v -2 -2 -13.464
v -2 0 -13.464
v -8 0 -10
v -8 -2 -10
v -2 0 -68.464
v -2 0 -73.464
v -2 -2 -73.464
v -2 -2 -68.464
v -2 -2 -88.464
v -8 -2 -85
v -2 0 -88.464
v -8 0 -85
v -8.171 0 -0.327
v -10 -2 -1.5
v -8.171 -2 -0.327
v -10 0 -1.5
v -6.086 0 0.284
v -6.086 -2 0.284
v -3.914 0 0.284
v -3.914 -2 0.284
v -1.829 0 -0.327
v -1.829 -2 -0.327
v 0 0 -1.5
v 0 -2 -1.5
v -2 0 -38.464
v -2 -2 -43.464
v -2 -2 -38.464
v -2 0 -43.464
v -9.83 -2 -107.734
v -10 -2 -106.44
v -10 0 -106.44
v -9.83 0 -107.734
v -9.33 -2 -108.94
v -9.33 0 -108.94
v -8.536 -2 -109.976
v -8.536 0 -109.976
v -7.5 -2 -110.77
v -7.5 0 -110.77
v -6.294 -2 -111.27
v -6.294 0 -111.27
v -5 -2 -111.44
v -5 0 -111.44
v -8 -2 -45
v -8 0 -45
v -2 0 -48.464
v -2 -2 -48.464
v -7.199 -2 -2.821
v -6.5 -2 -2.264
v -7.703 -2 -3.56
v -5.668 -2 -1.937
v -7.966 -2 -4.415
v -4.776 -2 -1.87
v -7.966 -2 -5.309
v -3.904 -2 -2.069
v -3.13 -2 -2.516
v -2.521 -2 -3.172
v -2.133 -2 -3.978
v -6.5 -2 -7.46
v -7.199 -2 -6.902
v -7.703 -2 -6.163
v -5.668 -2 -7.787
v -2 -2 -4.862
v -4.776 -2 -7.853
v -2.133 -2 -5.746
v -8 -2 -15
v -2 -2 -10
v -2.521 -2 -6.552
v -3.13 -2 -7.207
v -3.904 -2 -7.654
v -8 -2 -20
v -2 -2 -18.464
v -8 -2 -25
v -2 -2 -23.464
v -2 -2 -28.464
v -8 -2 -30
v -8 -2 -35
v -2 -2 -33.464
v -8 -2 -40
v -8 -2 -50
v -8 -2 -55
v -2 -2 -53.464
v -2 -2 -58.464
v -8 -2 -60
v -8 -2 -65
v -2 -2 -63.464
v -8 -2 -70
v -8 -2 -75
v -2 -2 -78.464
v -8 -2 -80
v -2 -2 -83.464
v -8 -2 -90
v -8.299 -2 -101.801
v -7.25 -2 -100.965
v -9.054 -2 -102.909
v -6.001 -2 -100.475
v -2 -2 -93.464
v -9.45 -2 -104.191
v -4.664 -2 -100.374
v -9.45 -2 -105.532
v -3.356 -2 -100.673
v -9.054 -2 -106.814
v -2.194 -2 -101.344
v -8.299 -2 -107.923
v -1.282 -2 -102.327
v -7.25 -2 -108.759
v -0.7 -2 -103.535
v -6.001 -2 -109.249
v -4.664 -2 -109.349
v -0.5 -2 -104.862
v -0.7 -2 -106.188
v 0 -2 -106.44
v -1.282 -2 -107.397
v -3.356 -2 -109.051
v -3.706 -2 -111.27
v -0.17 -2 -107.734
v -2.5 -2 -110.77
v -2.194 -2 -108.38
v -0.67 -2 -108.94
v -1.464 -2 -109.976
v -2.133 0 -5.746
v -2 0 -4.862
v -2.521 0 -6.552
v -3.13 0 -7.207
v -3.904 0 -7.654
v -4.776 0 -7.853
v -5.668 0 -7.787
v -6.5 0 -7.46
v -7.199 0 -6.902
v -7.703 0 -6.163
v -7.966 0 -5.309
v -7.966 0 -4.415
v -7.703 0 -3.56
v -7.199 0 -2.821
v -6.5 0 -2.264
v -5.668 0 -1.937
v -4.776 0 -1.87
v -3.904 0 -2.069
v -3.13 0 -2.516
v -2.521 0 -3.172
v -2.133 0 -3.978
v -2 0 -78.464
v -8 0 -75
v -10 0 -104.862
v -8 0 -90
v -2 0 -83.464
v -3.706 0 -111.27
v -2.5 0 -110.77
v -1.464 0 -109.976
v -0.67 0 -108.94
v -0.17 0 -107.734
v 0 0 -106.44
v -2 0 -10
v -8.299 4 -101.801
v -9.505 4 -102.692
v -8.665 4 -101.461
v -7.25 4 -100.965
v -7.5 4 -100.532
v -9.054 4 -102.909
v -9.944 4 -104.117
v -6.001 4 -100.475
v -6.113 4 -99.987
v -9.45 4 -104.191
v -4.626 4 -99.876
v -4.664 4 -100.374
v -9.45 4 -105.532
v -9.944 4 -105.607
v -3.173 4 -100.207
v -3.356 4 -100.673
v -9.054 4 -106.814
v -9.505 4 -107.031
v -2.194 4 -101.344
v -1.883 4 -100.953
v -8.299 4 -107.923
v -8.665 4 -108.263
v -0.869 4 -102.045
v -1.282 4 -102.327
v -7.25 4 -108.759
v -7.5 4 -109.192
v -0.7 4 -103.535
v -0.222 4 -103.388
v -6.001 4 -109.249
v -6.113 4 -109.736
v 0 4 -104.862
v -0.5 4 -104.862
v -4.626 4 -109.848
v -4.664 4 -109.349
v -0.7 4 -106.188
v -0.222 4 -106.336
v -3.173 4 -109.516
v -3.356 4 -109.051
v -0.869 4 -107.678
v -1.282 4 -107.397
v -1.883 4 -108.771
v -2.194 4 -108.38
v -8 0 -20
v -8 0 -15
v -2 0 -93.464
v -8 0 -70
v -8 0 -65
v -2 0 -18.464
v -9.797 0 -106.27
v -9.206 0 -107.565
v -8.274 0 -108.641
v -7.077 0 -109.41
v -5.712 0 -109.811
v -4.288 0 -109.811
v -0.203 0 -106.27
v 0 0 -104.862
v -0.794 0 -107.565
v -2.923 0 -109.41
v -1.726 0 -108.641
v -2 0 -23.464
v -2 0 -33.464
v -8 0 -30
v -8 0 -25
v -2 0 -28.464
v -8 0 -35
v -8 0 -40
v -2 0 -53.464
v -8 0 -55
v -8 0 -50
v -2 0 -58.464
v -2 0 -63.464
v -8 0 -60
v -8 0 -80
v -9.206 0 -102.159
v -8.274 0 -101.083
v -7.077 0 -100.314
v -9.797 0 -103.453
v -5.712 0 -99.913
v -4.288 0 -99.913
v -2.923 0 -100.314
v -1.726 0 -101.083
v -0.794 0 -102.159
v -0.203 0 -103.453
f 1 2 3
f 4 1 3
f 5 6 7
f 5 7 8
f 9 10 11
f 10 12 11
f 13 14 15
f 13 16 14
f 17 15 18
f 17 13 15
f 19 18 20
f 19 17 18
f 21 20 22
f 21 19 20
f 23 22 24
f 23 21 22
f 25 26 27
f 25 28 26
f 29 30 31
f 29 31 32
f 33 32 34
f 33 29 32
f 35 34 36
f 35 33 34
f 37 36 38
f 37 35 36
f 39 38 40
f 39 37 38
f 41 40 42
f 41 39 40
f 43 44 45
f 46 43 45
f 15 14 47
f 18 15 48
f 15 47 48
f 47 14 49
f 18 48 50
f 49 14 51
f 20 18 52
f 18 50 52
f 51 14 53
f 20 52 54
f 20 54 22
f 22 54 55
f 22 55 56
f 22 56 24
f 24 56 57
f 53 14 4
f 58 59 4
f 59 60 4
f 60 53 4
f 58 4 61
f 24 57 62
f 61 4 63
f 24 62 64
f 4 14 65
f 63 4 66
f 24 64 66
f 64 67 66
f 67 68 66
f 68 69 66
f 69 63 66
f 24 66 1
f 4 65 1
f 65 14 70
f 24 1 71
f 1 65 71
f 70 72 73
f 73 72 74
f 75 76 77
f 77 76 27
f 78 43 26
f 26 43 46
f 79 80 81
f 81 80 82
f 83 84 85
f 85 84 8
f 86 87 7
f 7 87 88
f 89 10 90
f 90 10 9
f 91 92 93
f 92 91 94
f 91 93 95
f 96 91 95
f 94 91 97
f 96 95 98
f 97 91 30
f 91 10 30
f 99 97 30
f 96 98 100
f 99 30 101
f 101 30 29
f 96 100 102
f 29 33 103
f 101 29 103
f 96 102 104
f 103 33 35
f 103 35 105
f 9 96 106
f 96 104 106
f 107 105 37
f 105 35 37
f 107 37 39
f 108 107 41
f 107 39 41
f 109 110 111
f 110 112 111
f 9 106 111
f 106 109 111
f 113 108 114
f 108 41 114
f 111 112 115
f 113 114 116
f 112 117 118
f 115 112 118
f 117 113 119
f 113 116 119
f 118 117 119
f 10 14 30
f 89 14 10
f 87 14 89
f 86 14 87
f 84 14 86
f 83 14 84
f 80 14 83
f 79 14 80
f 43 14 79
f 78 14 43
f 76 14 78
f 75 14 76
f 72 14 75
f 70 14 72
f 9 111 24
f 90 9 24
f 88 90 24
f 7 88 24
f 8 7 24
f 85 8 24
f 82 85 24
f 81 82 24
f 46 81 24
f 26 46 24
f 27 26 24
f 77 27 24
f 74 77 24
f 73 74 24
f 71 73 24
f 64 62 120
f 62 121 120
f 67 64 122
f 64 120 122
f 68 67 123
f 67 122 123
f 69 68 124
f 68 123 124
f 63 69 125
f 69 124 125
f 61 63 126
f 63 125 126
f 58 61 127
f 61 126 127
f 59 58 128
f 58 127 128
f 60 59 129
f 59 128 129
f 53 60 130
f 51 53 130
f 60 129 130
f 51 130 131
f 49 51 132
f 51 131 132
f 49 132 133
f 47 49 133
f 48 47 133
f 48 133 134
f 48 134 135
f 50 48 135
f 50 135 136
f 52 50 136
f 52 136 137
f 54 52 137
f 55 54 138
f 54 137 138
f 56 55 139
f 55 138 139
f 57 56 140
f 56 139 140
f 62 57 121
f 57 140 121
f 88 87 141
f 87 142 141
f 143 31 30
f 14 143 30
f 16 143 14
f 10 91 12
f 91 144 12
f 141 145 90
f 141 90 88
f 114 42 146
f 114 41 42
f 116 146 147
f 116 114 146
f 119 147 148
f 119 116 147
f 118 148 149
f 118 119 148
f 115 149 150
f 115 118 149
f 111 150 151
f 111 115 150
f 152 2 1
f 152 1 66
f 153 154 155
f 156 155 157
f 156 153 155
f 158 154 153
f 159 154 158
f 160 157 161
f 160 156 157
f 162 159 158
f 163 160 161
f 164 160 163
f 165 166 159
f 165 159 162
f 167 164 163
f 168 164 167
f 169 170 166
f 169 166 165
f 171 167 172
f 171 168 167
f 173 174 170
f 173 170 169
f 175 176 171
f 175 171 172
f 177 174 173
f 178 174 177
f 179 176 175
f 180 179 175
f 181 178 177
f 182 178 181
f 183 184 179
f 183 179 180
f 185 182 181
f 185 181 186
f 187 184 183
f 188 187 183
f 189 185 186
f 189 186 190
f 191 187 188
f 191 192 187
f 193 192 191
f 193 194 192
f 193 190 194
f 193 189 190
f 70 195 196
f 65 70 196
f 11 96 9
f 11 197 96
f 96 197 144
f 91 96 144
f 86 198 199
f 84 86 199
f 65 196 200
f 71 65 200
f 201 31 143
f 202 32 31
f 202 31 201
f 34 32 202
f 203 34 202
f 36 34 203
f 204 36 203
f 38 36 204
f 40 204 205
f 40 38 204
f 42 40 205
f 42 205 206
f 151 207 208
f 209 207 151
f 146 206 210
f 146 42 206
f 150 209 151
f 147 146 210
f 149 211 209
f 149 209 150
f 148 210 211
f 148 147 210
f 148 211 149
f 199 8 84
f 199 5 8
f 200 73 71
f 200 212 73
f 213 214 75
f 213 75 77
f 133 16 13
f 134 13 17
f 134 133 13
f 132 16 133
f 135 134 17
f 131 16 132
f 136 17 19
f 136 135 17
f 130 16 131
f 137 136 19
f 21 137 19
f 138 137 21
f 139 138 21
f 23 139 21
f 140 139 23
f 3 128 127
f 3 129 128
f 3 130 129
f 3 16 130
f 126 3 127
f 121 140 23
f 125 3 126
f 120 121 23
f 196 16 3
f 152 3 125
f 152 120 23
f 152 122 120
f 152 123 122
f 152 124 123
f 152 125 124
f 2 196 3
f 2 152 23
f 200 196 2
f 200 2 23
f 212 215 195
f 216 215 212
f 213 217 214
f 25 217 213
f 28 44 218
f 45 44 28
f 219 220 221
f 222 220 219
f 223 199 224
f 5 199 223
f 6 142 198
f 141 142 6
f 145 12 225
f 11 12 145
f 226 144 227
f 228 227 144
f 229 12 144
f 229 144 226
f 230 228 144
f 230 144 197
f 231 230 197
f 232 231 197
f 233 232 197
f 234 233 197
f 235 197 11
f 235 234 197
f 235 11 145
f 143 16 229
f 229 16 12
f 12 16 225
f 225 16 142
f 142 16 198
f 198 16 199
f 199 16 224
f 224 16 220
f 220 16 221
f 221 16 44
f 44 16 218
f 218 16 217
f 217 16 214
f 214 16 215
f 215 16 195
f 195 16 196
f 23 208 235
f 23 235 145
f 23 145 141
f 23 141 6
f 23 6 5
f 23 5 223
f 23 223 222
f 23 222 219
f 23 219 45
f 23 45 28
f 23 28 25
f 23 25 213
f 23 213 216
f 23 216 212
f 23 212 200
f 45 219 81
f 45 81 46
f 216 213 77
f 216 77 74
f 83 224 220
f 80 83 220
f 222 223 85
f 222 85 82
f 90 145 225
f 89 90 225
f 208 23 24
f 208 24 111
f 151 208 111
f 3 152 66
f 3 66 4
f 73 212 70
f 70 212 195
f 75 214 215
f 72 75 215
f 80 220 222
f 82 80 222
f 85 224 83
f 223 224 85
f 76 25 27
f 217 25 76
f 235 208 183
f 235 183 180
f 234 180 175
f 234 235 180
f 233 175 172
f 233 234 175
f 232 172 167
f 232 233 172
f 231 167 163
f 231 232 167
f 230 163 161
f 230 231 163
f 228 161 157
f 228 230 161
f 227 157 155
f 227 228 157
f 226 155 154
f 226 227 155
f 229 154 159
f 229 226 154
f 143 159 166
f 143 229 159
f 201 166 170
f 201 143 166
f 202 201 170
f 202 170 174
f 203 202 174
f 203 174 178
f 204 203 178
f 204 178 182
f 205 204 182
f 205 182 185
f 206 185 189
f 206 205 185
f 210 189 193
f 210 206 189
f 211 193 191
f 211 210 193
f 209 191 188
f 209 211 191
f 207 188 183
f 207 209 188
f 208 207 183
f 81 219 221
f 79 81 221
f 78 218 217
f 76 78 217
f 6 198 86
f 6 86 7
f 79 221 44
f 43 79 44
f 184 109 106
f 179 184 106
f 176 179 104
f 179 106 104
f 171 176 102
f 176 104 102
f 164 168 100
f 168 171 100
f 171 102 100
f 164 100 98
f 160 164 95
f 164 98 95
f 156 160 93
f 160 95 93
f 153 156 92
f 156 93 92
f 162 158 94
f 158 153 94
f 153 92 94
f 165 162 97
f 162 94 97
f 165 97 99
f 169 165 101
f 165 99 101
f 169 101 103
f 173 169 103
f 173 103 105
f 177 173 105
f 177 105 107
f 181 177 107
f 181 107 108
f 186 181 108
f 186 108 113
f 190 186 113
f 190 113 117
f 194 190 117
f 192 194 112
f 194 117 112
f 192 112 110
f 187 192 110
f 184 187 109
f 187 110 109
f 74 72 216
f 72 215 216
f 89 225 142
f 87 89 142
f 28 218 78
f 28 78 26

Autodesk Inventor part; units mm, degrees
ref_plane "YZ Plane" through (0, 0, 0) normal (1, 0, 0) x (0, 1, 0)
ref_plane "XZ Plane" through (0, 0, 0) normal (0, 1, 0) x (-1, 0, 0)
sketch "Szkic3" plane through (0, 0, 0) normal (0, 1, 0) x (-1, 0, 0)
  line L0 (0, 0) -> (10, 0)
  line L1 (10, 0) -> (10, -50)
  line L2 (10, -50) -> (0, -50)
  line L3 (0, -50) -> (0, 0)
  circle A0 centre (5, -5) radius 2.5
  arc A1 (10, -2.5) -> (0, -2.5) centre (5, -6.25) ccw
  line L4 (8, -50) -> (2, -50)
  line L5 (2, -50) -> (2, -10)
  line L6 (2, -10) -> (8, -10)
  line L7 (8, -10) -> (8, -50)
  line L8 (2, -10) -> (8, -16)
  line L9 (2, -10) -> (10.4853, -10) construction
  line L10 (8, -16) -> (8, -18)
  line L11 (8, -18) -> (2, -12)
  line L12 (2, -10) -> (2, -12)
  line L13 (8, -18) -> (8, -22)
  line L14 (2, -16) -> (8, -22)
  line L15 (8, -24) -> (2, -18)
  line L16 (8, -16) -> (8, -14)
  line L17 (8, -24) -> (8, -26)
  line L18 (2, -20) -> (8, -26)
  line L19 (8, -28) -> (2, -22)
  line L20 (8, -28) -> (8, -32)
  line L21 (2, -26) -> (8, -32)
  line L22 (8, -34) -> (2, -28)
  line L23 (8, -34) -> (8, -36)
  line L24 (2, -26) -> (8, -32)
  line L25 (8, -34) -> (2, -28)
  line L26 (8, -34) -> (8, -38)
  line L27 (2, -32) -> (8, -38)
  line L28 (8, -40) -> (2, -34)
  line L29 (8, -40) -> (8, -42)
  line L30 (2, -32) -> (8, -38)
  line L31 (8, -40) -> (2, -34)
  line L32 (8, -40) -> (8, -44)
  line L33 (2, -38) -> (8, -44)
  line L34 (8, -46) -> (2, -40)
  line L35 (8, -46) -> (8, -48)
  line L36 (2, -38) -> (8, -44)
  line L37 (8, -46) -> (2, -40)
  line L38 (8, -46) -> (8, -50)
  line L39 (8, -46) -> (8, -48)
  line L40 (8, -48) -> (2, -42)
  line L41 (2, -42) -> (2, -44)
  line L42 (2, -44) -> (8, -50)
  line L43 (7, -49) -> (2, -49)
  circle A2 centre (5, -5) radius 3.25
  dimension "d9" = 10
  dimension "d10" = 50
  dimension "d11" = 5
  dimension "d12" = 6
  dimension "d13" = 40
  dimension "d14" = 45
  dimension "d15" = 2
  dimension "d16" = 4
  dimension "d17" = 2
  dimension "d18" = 2
  dimension "d19" = 2
  dimension "d20" = 2
  dimension "d21" = 4
  dimension "d22" = 2
  dimension "d23" = 2
  dimension "d24" = 2
  dimension "d25" = 4
  dimension "d26" = 2
  dimension "d27" = 2
  dimension "d28" = 2
  dimension "d29" = 4
  dimension "d30" = 2
  dimension "d32" = 2
  dimension "d36" = 2
  dimension "d37" = 2
  dimension "d42" = 6.5
extrude "Wyciągnięcie proste2" add sketch "Szkic3" against normal blind 2 contours A1 L1 L2 L7 L6 L5 L3 | L5 L43 L42 L2 | L42 L5 L40 L7 | L34 L5 L33 L7 | L28 L5 L27 L7 | L5 L21 L7 L22 | L5 L18 L7 L19 | L5 L14 L7 L15 | L5 L8 L7 L11 | A2
ref_plane "Płaszczyzna konstrukcyjna1" through (0, 0, -50) normal (0, 0, -1) x (-1, 0, 0)
mirror "Odbij1" about plane through (0, 0, -50) normal (0, 0, -1) of "Wyciągnięcie proste2"
sketch "Szkic4" plane through (0, 0, 0) normal (0, 1, 0) x (1, 0, 0)
  line L0 (-7.5, 91.0504) -> (-2.5, 91.0504)
  line L1 (-2.5, 91.0504) -> (-2.5, 98.6571)
  line L2 (-2.5, 98.6571) -> (-7.5, 98.6571)
  line L3 (-7.5, 98.6571) -> (-7.5, 91.0504)
  point P0 (0, 0)
extrude "Wyciągnięcie proste3" cut sketch "Szkic4" against normal blind 2
sketch "Szkic5" plane through (0, 0, 0) normal (0, 1, 0) x (1, 0, 0)
  line L0 (-10, 2.5) -> (-10, 97.5) projected
  line L1 (-10, 97.5) -> (-10, 67.5)
  line L2 (-10, 67.5) -> (-13, 67.5)
  line L3 (-13, 67.5) -> (-13, 97.5)
  line L4 (-13, 97.5) -> (-10, 97.5)
  arc A0 (0, 97.5) -> (-10, 97.5) centre (-5, 93.75) ccw projected
  line L5 (-5, 100) -> (-5, 49.8742)
  line L6 (-5, 100) -> (45.1258, 100) construction
  line L7 (-13, 67.5) -> (-10, 62.3038)
  line L8 (-13, 67.5) -> (-7, 67.5) construction
  line L9 (-10, 62.3038) -> (-10, 67.5)
  line L10 (0, 2.5) -> (0, 97.5)
  line L11 (0, 67.5) -> (3, 67.5)
  line L12 (3, 67.5) -> (3, 97.5)
  line L13 (3, 97.5) -> (0, 97.5)
  line L14 (3, 67.5) -> (0, 62.3038)
  arc A1 (3, 97.5) -> (-13, 97.5) centre (-5, 94.4495) ccw
  point P0 (0, 0)
  dimension "d43" = 30
  dimension "d44" = 3
  dimension "d45" = 90
  dimension "d46" = 60
extrude "Wyciągnięcie proste4" add sketch "Szkic5" against normal blind 2
sketch "Szkic6" plane through (0, 0, 0) normal (0, 1, 0) x (1, 0, 0)
  line L0 (-10, 62.3038) -> (-10, 2.5) projected
  line L1 (-10, 62.3038) -> (-10, 97.356)
  line L2 (-10, 97.356) -> (0, 97.356)
  line L3 (0, 97.356) -> (0, 62.3038)
  line L4 (0, 62.3038) -> (-10, 62.3038)
  point P0 (0, 0)
extrude "Wyciągnięcie proste5" cut sketch "Szkic6" against normal blind 2
sketch "Szkic7" plane through (0, 0, 0) normal (0, 1, 0) x (1, 0, 0)
  line L0 (-10, 62.3038) -> (-8, 62.3038) projected
  line L1 (-10, 62.3038) -> (-10, 67.4287)
  line L2 (-10, 62.3038) -> (-10, 97.356) projected
  line L3 (-10, 67.4287) -> (0, 67.4287)
  line L4 (0, 62.3038) -> (0, 97.356) projected
  line L5 (0, 62.3038) -> (0, 67.4287)
  line L6 (0, 62.3038) -> (-2, 62.3038) projected
  line L7 (-10, 2.5) -> (-10, 62.3038) projected
  line L8 (0, 62.3038) -> (-10, 62.3038)
  line L9 (-10, 62.3038) -> (-10, 61.2351)
  line L10 (-10, 61.2351) -> (0, 61.2351)
  line L11 (0, 61.2351) -> (0, 62.3038)
  line L12 (-10, 61.2351) -> (0, 61.2351)
  line L13 (0, 2.5) -> (0, 62.3038) projected
  line L14 (0, 61.2351) -> (0, 67.4287)
  line L15 (0, 67.4287) -> (-10, 67.4287)
  line L16 (-10, 61.2351) -> (-10, 67.4287)
  point P0 (0, 0)
extrude "Wyciągnięcie proste6" add sketch "Szkic7" against normal blind 2
sketch "Szkic8" plane through (0, 0, 0) normal (0, 1, 0) x (1, 0, 0)
  line L0 (-7.5, 97.356) -> (-10, 97.356) projected
  line L1 (-10, 97.356) -> (-11, 97.356)
  line L2 (-11, 97.356) -> (-11, 67.4287)
  line L3 (-11, 67.4287) -> (-10, 67.4287)
  line L4 (-10, 67.4287) -> (-10, 97.356)
  line L5 (0, 97.356) -> (1, 97.356)
  line L6 (1, 97.356) -> (1, 67.4287)
  line L7 (1, 67.4287) -> (0, 67.4287)
  line L8 (0, 67.4287) -> (0, 97.356)
  line L9 (-11, 67.4287) -> (1, 67.4287)
  line L10 (1, 67.4287) -> (1, 72.7222)
  line L11 (1, 72.7222) -> (-11, 72.7222)
  line L12 (-11, 72.7222) -> (-11, 67.4287)
  point P0 (0, 0)
  point P1 (0, 72.7222)
  point P2 (-10, 72.7222)
  dimension "d53" = 1
  dimension "d54" = 1
extrude "Wyciągnięcie proste7" cut sketch "Szkic8" against normal blind 2 contours L4 L11 L2 L1 | L8 L5 L6 L11
sketch "Szkic9" plane through (0, 0, 0) normal (0, 1, 0) x (1, 0, 0)
  line L0 (-10, 72.7222) -> (0, 72.7222)
  line L1 (0, 72.7222) -> (0, 67.3617)
  line L2 (0, 67.3617) -> (-10, 67.3617)
  line L3 (-10, 67.3617) -> (-10, 72.7222)
  point P0 (0, 0)
extrude "Wyciągnięcie proste8" add sketch "Szkic9" against normal blind 2
sketch "Szkic10" plane through (0, 0, 0) normal (0, 1, 0) x (1, 0, 0)
  point P0 (0, 0)
split "Podział1" plane through (0, 0, -50) removes the side toward (0, 0, -1)
sketch "Szkic11" plane through (0, 0, 0) normal (0, 1, 0) x (1, 0, 0)
  line L0 (-10, 2.5) -> (-10, 50) projected
  line L1 (-10, 50) -> (0, 50)
  line L2 (0, 50) -> (0, 100)
  line L3 (0, 100) -> (-10, 100)
  line L4 (-10, 100) -> (-10, 50)
  line L5 (-10, 100) -> (0, 100)
  line L6 (0, 100) -> (0, 124.634)
  line L7 (0, 124.634) -> (-10, 124.634)
  line L8 (-10, 124.634) -> (-10, 100)
  line L9 (-10, 124.634) -> (-11, 124.634)
  line L10 (-11, 124.634) -> (-11, 100)
  line L11 (-11, 100) -> (-10, 100)
  line L12 (-10, 100) -> (-10, 124.634)
  line L13 (0, 124.634) -> (1, 124.634)
  line L14 (1, 124.634) -> (1, 100)
  line L15 (1, 100) -> (0, 100)
  line L16 (0, 100) -> (0, 124.634)
  line L17 (-11, 100) -> (-9, 100) construction
  line L18 (1, 100) -> (3, 100) construction
  line L19 (-11, 124.634) -> (1, 124.634)
  line L20 (1, 124.634) -> (1, 126.634)
  line L21 (1, 126.634) -> (-11, 126.634)
  line L22 (-11, 126.634) -> (-11, 124.634)
  line L23 (-11, 100) -> (-12, 100)
  line L24 (-12, 100) -> (-12, 126.634)
  line L25 (-12, 126.634) -> (-11, 126.634)
  line L26 (-11, 126.634) -> (-11, 100)
  line L27 (1, 126.634) -> (2, 126.634)
  line L28 (2, 126.634) -> (2, 100)
  line L29 (2, 100) -> (1, 100)
  line L30 (1, 100) -> (1, 126.634)
  line L31 (-12, 100) -> (-10, 96.5359)
  line L32 (-12, 100) -> (-8, 100) construction
  line L33 (2, 100) -> (0, 96.5359)
  line L34 (2, 100) -> (6, 100) construction
  line L35 (-10, 124.634) -> (-10.5, 124.634)
  line L36 (-10.5, 124.634) -> (-10.5, 100)
  line L37 (0.5, 100) -> (0.5, 124.634)
  line L38 (0.75, 100) -> (0.75, 124.634)
  line L39 (-11, 100) -> (-10.75, 100)
  line L40 (-10.75, 100) -> (-10.75, 124.634)
  point P0 (0, 0)
  dimension "d59" = 10
  dimension "d60" = 50
  dimension "d61" = 10
  dimension "d62" = 24.634
  dimension "d63" = 1
  dimension "d64" = 1
  dimension "d67" = 2
  dimension "d68" = 1
  dimension "d69" = 1
  dimension "d70" = 60
  dimension "d71" = 120
  dimension "d90" = 0.5
  dimension "d107" = 0.25
extrude "Wyciągnięcie proste9" add sketch "Szkic11" against normal blind 2 contours L4 L3 L2 L1 | L31 L23 L11 L4 | L2 L15 L29 L33 | L24 L25 L22 L10 L23 | L29 L14 L20 L27 L28 | L9 L22 L21 L20 L13 L7
sketch "Szkic12" plane through (0, 0, 0) normal (0, 1, 0) x (1, 0, 0)
  line L0 (-8, 51.0298) -> (-2, 51.0298)
  line L1 (-2, 51.0298) -> (-2, 96.6875)
  line L2 (-2, 96.6875) -> (-8, 96.6875)
  line L3 (-8, 96.6875) -> (-8, 51.0298)
  line L4 (-8, 51.0298) -> (-2, 54.4939)
  line L5 (-8, 51.0298) -> (-1.0718, 51.0298) construction
  line L6 (-2, 54.4939) -> (-2, 59.4939)
  line L7 (-2, 59.4939) -> (-8, 56.0298)
  line L8 (-8, 51.0298) -> (-8, 56.0298)
  line L9 (-8, 56.0298) -> (-8, 61.0298)
  line L10 (-8, 61.0298) -> (-2, 64.4939)
  line L11 (-2, 64.4939) -> (-2, 69.4939)
  line L12 (-2, 69.4939) -> (-8, 66.0298)
  line L13 (-8, 61.0298) -> (-8, 66.0298)
  line L14 (-8, 66.0298) -> (-2, 69.4939)
  line L15 (-2, 74.4939) -> (-8, 71.0298)
  line L16 (-8, 76.0298) -> (-2, 79.4939)
  line L17 (-2, 84.4939) -> (-8, 81.0298)
  line L18 (-8, 71.0298) -> (-2, 74.4939)
  line L19 (-2, 79.4939) -> (-8, 76.0298)
  line L20 (-8, 81.0298) -> (-2, 84.4939)
  line L21 (-2, 89.4939) -> (-8, 86.0298)
  line L22 (-8, 76.0298) -> (-2, 79.4939)
  line L23 (-2, 84.4939) -> (-8, 81.0298)
  line L24 (-8, 86.0298) -> (-2, 89.4939)
  line L25 (-2, 94.4939) -> (-8, 91.0298)
  point P0 (0, 0)
  dimension "d74" = 30
  dimension "d75" = 5
  dimension "d76" = 5
  dimension "d77" = 5
  dimension "d78" = 5
  dimension "d79" = 5
  dimension "d80" = 5
  dimension "d81" = 5
  dimension "d82" = 5
  dimension "d83" = 5
  dimension "d84" = 5
  dimension "d85" = 5
  dimension "d86" = 5
extrude "Wyciągnięcie proste10" cut sketch "Szkic12" against normal blind 2 contours L3 L7 L1 L4 | L3 L12 L1 L10 | L3 L16 L1 L15 | L3 L21 L1 L17 | L3 L2 L1 L25
sketch "Szkic14" plane through (0, 0, 0) normal (0, 1, 0) x (1, 0, 0)
  arc A0 (5, 2.5) -> (15, 2.5) centre (10, 6.2465) ccw
  circle A1 centre (10, 5) radius 2.5
  line L0 (5, 2.5) -> (5, 5)
  line L1 (15, 2.5) -> (15, 5)
  line L2 (5, 5) -> (10, 104.8749)
  line L3 (10, 104.8749) -> (15, 5)
  line L4 (5.1827, 8.65) -> (14.8173, 8.65)
  line L5 (6.9979, 8.65) -> (12.6647, 8.65) construction
  line L6 (5.1827, 8.65) -> (7.1827, 8.65)
  line L7 (14.8173, 8.65) -> (12.8173, 8.65)
  line L8 (12.8173, 8.65) -> (9.8313, 56.0603)
  line L9 (9.8313, 56.0603) -> (7.1827, 8.65)
  line L10 (7.2581, 10) -> (12.7322, 10)
  point P0 (0, 0)
  dimension "d91" = 10
  dimension "d92" = 5
  dimension "d93" = 100
  dimension "d103" = 2
  dimension "d104" = 2
extrude "Wyciągnięcie proste11" add sketch "Szkic14" against normal blind 2 contours L0 L2 L4 L3 L1 A0 | L2 L3 L4 L8 L9 | L9 L10 L8 L4
sketch "Szkic15" plane through (0, 0, 0) normal (0, 1, 0) x (1, 0, 0)
  line L0 (-8, 91.0298) -> (-8, 96.6875) projected
  line L1 (-2, 10) -> (-8, 10) projected
  line L2 (-8, 96.6875) -> (-2, 96.6875)
  line L3 (-2, 96.6875) -> (-2, 10)
  line L4 (-2, 10) -> (-8, 10)
  line L5 (-8, 10) -> (-8, 96.6875)
  point P0 (0, 0)
extrude "Wyciągnięcie proste12" cut sketch "Szkic15" against normal blind 2
sketch "Szkic19" plane through (2, 0, -100) normal (1, 0, 0) x (0, 0, -1)
  line L0 (39.9881, 21.4734) -> (-120.2221, 21.4734)
  line L1 (-120.2221, 21.4734) -> (-120.2221, -34.3653)
  line L2 (-120.2221, -34.3653) -> (39.9881, -34.3653)
  line L3 (39.9881, -34.3653) -> (39.9881, 21.4734)
  point P0 (-100, 0)
extrude "Wyciągnięcie proste16" cut sketch "Szkic19" along normal blind 34.5
sketch "Szkic20" plane through (0, 0, 0) normal (0, 1, 0) x (1, 0, 0)
  line L0 (-8, 10) -> (-8, 15)
  line L1 (-8, 10) -> (-8, 96.6875) projected
  line L2 (-8, 15) -> (-2, 18.4641)
  line L3 (-2, 96.6875) -> (-2, 10) projected
  line L4 (-2, 18.4641) -> (-2, 13.4641)
  line L5 (-2, 13.4641) -> (-8, 10)
  line L6 (-2, 18.4641) -> (-2, 23.4641)
  line L7 (-2, 23.4641) -> (-8, 20)
  line L8 (-8, 20) -> (-8, 15)
  line L9 (-8, 20) -> (-8, 25)
  line L10 (-8, 25) -> (-2, 28.4641)
  line L11 (-2, 28.4641) -> (-2, 23.4641)
  line L12 (-8, 30) -> (-2, 33.4641)
  line L13 (-2, 28.4641) -> (-8, 25)
  line L14 (-2, 38.4641) -> (-8, 35)
  line L15 (-8, 40) -> (-2, 43.4641)
  line L16 (-8, 45) -> (-2, 48.4641)
  line L17 (-2, 43.4641) -> (-8, 40)
  line L18 (-2, 53.4641) -> (-8, 50)
  line L19 (-8, 55) -> (-2, 58.4641)
  line L20 (-8, 60) -> (-2, 63.4641)
  line L21 (-2, 58.4641) -> (-8, 55)
  line L22 (-2, 68.4641) -> (-8, 65)
  line L23 (-8, 70) -> (-2, 73.4641)
  line L24 (-8, 75) -> (-2, 78.4641)
  line L25 (-2, 73.4641) -> (-8, 70)
  line L26 (-2, 83.4641) -> (-8, 80)
  line L27 (-8, 85) -> (-2, 88.4641)
  line L28 (-8, 85) -> (-2, 88.4641)
  line L29 (-2, 83.4641) -> (-8, 80)
  line L30 (-2, 93.4641) -> (-8, 90)
  line L31 (-8, 95) -> (-2, 98.4641)
  line L32 (-2, 93.4641) -> (-2, 96.6875)
  line L33 (-2, 96.6875) -> (-5, 96.7321)
  line L34 (-8, 95) -> (-8, 90)
  dimension "d149" = 5
  dimension "d150" = 120
  dimension "d151" = 5
  dimension "d152" = 5
  dimension "d153" = 5
  dimension "d154" = 5
  dimension "d155" = 5
  dimension "d156" = 5
  dimension "d157" = 5
  dimension "d158" = 5
  dimension "d159" = 5
  dimension "d160" = 5
  dimension "d161" = 5
  dimension "d162" = 5
  dimension "d163" = 5
  dimension "d164" = 5
  dimension "d165" = 5
  dimension "d166" = 5
  dimension "d167" = 5
  dimension "d168" = 5
  dimension "d169" = 5
  dimension "d170" = 5
  dimension "d171" = 5
  dimension "d172" = 5
  dimension "d173" = 5
extrude "Wyciągnięcie proste17" add sketch "Szkic20" against normal blind 2 contours L0 L2 L3 L5 | L1 L10 L3 L7 | L1 L14 L3 L12 | L1 L16 L3 L15 | L1 L19 L3 L18 | L1 L22 L3 L20 | L1 L24 L3 L23 | L1 L27 L3 L26 | L1 L31 L33 L3 L30
sketch "Szkic21" plane through (0, 0, 0) normal (0, 1, 0) x (1, 0, 0)
  circle A0 centre (-5, 5) radius 2.5 projected
  circle A1 centre (-5, 5) radius 2.75
  point P0 (0, 0)
  dimension "d176" = 5.5
extrude "Wyciągnięcie proste18" cut sketch "Szkic21" against normal blind 2
sketch "Szkic22" plane through (0, 0, 0) normal (0, 1, 0) x (1, 0, 0)
  line L0 (-11, 100) -> (1, 100) projected
  line L1 (-5, 100) -> (-7, 100)
  line L2 (-7, 100) -> (-7, 98)
  line L3 (-7, 98) -> (-5, 98)
  line L4 (-5, 98) -> (-5, 100)
  line L5 (-5, 100) -> (-3, 100)
  line L6 (-3, 100) -> (-3, 98)
  line L7 (-3, 98) -> (-5, 98)
  line L8 (-5, 98) -> (-5, 100)
  circle A0 centre (-5, 4.8618) radius 4.375
  point P0 (0, 0)
  dimension "d179" = 2
  dimension "d180" = 2
  dimension "d181" = 2
  dimension "d182" = 2
  dimension "d183" = 8.75
extrude "Wyciągnięcie proste19" cut sketch "Szkic22" against normal blind 2
sketch "Szkic23" plane through (0, 0, 0) normal (0, 1, 0) x (1, 0, 0)
  arc A0 (-10, 2.5) -> (0, 2.5) centre (-5, 6.25) ccw projected
  line L0 (-10, 2.5) -> (-10, 1.5)
  line L1 (0, 2.5) -> (0, 1.5)
  arc A1 (-10, 1.5) -> (0, 1.5) centre (-5, 7.2819) ccw
  point P0 (0, 0)
  dimension "d186" = 1
  dimension "d187" = 1
extrude "Wyciągnięcie proste20" add sketch "Szkic23" against normal blind 2
sketch "Szkic24" plane through (0, 0, 0) normal (0, 1, 0) x (1, 0, 0)
  circle A0 centre (-5, 4.8618) radius 4.375 projected
  circle A1 centre (-5, 4.8618) radius 3.5
  circle A2 centre (-5, 4.8618) radius 4.375
  circle A3 centre (-5, 4.8618) radius 3
  point P0 (0, 0)
  dimension "d190" = 7
  dimension "d191" = 6
extrude "Wyciągnięcie proste21" add sketch "Szkic24" against normal blind 2 contours A0 | A1
sketch "Szkic25" plane through (0, 0, 0) normal (0, 1, 0) x (1, 0, 0)
  line L0 (3.7776, 94.4401) -> (-14.9005, 94.4401)
  line L1 (-14.9005, 94.4401) -> (-14.9005, 129.9076)
  line L2 (-14.9005, 129.9076) -> (3.7776, 129.9076)
  line L3 (3.7776, 129.9076) -> (3.7776, 94.4401)
  point P0 (0, 0)
extrude "Wyciągnięcie proste22" cut sketch "Szkic25" against normal blind 2
sketch "Szkic26" plane through (0, 0, 0) normal (0, 1, 0) x (1, 0, 0)
  circle A0 centre (-5, 4.8618) radius 3 projected
  line L0 (-5, 4.8618) -> (-5, 104.8618)
  line L1 (-5, 4.8618) -> (95, 4.8618) construction
  circle A1 centre (-5, 104.8618) radius 4.5
  line L2 (-10, 1.5) -> (-10, 94.4401) projected
  line L3 (-10, 94.4401) -> (0, 94.4401)
  line L4 (0, 94.4401) -> (0, 111.4401)
  line L5 (0, 111.4401) -> (-10, 111.4401)
  line L6 (-10, 111.4401) -> (-10, 94.4401)
  point P0 (0, 0)
  dimension "d196" = 100
  dimension "d197" = 90
  dimension "d198" = 9
  dimension "d199" = 17
extrude "Wyciągnięcie proste23" add sketch "Szkic26" against normal blind 2 contours L6 L5 L4 L3
fillet "Zaokrąglenie1" radius 5 2 edges at (-10, -1, -111.4401) (0, -1, -111.4401)
sketch "Szkic27" plane through (0, 0, 0) normal (0, 1, 0) x (1, 0, 0)
  circle A0 centre (-5, 104.8618) radius 4.5 projected
  circle A1 centre (-5, 104.8618) radius 4.5
  circle A2 centre (-5, 104.8618) radius 5
  line L0 (0, 1.5) -> (0, 106.4401) projected
  point P0 (0, 0)
extrude "Wyciągnięcie proste24" add sketch "Szkic27" along normal blind 4
properties part number "arm_v2(base-arm)"
